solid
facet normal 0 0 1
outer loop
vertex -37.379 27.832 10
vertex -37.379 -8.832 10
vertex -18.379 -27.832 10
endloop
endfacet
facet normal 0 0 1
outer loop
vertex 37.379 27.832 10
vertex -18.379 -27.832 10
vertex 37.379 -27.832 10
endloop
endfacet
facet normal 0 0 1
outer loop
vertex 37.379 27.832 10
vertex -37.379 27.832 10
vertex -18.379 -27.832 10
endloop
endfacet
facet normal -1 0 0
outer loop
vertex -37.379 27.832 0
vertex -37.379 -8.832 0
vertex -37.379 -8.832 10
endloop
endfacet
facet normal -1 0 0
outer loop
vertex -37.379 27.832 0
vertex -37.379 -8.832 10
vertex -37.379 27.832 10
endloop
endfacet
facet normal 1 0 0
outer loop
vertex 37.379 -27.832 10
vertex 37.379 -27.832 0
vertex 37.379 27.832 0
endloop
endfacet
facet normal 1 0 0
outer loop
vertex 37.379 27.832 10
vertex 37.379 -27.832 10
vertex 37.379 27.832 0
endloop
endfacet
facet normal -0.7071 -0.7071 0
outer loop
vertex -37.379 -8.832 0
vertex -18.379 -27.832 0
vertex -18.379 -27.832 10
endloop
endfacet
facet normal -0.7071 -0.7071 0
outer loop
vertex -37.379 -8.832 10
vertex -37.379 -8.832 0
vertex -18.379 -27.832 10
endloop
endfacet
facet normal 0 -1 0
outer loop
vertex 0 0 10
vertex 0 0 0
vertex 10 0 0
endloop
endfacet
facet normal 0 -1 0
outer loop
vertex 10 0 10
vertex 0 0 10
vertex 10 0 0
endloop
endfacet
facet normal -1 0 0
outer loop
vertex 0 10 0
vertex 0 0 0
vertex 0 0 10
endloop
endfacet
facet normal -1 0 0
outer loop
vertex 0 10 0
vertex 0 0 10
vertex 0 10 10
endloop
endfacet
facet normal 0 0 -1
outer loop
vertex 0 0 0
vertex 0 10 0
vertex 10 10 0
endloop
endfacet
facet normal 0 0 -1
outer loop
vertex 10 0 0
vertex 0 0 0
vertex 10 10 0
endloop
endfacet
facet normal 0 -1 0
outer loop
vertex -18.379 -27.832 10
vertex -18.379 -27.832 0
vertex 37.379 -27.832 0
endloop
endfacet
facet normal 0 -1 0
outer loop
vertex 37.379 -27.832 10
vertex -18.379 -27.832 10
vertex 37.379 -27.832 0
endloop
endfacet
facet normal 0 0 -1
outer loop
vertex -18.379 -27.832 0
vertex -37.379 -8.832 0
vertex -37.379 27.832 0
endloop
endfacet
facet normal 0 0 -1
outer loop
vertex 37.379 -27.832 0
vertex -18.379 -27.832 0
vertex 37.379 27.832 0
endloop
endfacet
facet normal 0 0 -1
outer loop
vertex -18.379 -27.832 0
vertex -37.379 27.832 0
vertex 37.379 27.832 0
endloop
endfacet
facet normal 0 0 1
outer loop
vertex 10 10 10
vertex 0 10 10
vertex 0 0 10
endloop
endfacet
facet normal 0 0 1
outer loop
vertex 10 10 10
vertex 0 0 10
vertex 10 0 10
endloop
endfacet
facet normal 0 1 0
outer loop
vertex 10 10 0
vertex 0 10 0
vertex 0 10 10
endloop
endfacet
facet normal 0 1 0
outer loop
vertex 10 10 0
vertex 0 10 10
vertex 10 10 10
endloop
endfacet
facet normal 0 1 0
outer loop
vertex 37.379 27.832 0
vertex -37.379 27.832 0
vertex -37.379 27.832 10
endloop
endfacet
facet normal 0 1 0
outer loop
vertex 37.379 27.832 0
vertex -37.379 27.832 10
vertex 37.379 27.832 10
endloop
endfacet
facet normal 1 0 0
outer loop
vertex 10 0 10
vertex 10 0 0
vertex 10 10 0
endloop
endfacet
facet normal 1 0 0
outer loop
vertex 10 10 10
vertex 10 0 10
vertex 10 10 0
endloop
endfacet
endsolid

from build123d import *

# Parameters (mm, degrees)
SKETCH_W     = 74.757034
SKETCH_H     = 55.66391
PAD_DEPTH    = 10
CHAMFER_SIZE = 19
BOX_W        = 10
BOX_H        = 10
BOX_DEPTH    = 10


with BuildPart() as body:
    # Sketch → Pad (new body)
    with BuildSketch(Plane.XY):
        Rectangle(SKETCH_W, SKETCH_H)
    extrude(amount=PAD_DEPTH)

    # Chamfer
    chamfer_edges = [body.edges().sort_by_distance(p)[0] for p in [
        (-37.378517, -27.831955, 5),
    ]]
    chamfer(chamfer_edges, length=CHAMFER_SIZE)


with BuildPart() as cube:
    # Box → Box (new body)
    with BuildSketch(Plane.XY):
        with Locations((5, 5)):
            Rectangle(BOX_W, BOX_H)
    extrude(amount=BOX_DEPTH)


solid = Compound([body.part, cube.part])
